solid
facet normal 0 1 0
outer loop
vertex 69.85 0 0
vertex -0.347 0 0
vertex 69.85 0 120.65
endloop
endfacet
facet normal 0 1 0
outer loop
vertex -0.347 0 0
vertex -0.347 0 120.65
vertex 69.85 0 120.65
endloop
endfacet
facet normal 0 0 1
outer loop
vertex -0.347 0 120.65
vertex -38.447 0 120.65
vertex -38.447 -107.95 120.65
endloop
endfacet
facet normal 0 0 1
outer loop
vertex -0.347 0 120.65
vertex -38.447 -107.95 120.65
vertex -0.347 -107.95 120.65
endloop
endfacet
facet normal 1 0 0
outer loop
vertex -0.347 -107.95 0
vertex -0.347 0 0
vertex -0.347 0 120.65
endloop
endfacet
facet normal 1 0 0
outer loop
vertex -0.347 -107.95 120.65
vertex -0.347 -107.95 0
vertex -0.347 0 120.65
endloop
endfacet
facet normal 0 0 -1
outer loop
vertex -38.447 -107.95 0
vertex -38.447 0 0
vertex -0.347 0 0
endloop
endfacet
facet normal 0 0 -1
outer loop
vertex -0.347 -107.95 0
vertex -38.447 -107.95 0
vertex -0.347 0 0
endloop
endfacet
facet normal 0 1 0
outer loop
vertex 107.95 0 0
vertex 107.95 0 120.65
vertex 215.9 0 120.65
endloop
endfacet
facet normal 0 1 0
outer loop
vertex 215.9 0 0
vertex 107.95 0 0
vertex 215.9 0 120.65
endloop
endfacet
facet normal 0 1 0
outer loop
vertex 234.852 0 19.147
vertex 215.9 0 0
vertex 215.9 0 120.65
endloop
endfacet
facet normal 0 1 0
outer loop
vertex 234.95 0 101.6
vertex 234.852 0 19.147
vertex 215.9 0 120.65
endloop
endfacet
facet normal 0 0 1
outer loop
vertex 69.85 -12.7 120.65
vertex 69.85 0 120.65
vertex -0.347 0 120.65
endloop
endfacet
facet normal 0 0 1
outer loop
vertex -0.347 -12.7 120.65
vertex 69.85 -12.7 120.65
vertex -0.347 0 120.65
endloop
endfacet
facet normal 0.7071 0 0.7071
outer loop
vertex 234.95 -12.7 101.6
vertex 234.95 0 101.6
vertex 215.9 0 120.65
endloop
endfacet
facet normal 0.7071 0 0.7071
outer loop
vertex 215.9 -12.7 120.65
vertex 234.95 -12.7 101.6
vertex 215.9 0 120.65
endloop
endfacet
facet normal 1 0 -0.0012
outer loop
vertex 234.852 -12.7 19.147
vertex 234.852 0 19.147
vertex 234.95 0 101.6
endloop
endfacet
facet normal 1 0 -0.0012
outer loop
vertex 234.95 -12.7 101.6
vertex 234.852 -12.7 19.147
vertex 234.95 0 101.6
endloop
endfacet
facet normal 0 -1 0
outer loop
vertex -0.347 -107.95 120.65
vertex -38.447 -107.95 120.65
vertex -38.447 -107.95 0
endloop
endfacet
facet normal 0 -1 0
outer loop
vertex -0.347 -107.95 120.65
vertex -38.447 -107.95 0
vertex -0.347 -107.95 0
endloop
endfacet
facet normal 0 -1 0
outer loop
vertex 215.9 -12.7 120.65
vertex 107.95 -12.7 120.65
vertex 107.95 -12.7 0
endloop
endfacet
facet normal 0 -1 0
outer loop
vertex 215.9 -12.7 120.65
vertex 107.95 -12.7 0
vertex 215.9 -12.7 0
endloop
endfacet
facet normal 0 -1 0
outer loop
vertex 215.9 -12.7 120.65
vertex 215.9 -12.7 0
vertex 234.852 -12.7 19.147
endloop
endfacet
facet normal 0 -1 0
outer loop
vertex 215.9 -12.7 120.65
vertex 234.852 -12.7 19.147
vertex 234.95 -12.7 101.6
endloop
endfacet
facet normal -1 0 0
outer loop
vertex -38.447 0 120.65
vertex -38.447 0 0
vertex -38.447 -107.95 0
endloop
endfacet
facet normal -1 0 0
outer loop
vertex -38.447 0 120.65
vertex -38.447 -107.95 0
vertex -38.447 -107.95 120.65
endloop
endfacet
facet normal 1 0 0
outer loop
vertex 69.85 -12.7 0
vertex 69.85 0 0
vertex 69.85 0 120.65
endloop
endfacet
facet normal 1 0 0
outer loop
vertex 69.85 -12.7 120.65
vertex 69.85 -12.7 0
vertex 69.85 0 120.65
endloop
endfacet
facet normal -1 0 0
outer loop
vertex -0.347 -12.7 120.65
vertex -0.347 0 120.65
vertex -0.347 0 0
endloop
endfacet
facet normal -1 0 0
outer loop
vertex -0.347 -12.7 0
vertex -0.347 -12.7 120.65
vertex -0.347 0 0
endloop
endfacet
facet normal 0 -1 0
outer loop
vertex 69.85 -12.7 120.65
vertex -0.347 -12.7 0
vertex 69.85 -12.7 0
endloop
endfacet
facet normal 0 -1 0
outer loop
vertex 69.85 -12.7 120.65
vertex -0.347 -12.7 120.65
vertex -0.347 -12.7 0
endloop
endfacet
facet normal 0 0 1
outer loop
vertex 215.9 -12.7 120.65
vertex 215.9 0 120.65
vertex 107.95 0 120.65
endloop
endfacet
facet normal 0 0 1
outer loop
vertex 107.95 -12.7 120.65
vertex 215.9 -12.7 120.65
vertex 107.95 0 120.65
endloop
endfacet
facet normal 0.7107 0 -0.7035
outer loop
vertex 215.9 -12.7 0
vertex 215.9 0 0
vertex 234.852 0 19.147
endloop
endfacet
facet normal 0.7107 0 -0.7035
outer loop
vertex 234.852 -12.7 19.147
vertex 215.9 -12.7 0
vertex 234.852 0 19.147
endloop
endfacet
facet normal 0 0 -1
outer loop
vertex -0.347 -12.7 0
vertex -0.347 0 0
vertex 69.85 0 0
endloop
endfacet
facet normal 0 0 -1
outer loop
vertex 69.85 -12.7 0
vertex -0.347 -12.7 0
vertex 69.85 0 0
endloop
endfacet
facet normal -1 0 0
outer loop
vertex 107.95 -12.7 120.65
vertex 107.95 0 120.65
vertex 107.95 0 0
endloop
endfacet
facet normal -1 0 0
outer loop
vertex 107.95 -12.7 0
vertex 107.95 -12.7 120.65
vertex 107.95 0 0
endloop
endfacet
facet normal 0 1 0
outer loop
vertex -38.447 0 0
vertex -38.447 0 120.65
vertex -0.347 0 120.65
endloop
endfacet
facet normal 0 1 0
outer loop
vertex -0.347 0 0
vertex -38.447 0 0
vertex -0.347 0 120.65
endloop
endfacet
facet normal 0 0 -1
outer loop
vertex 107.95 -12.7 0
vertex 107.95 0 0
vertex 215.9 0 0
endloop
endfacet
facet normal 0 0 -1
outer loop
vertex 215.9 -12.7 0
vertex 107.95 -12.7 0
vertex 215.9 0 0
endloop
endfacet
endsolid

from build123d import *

# Parameters (mm, degrees)
F1_DEPTH = 12.7
F0_W     = 38.1
F0_H     = 120.65
F2_DEPTH = 107.95


# Not quite as in the source:
# - a feature names something its author has since deleted; it is built from what else it names


with BuildPart() as f1:
    # F0 (on Front) → F1 (new body)
    with BuildSketch(Plane.XZ):
        Polygon((-0.3467756933, 0), (0, 0), (69.85, 0), (69.85, 120.65), (-0.3467756933, 120.65), align=None)
    extrude(amount=F1_DEPTH)


with BuildPart() as f1b:
    # F0 (on Front) → F1, piece 2 (new body)
    with BuildSketch(Plane.XZ):
        Polygon((107.95, 120.65), (107.95, 0), (215.9, 0), (234.8521879996, 19.1473123447), (234.95, 101.6), (215.9, 120.65), align=None)
    extrude(amount=F1_DEPTH)


with BuildPart() as f2:
    # F0 (on Front) → F2 (new body)
    with BuildSketch(Plane.XZ):
        with Locations((-19.3967756933, 60.325)):
            Rectangle(F0_W, F0_H)
    extrude(amount=F2_DEPTH)


solid = Compound([f1.part, f1b.part, f2.part])
